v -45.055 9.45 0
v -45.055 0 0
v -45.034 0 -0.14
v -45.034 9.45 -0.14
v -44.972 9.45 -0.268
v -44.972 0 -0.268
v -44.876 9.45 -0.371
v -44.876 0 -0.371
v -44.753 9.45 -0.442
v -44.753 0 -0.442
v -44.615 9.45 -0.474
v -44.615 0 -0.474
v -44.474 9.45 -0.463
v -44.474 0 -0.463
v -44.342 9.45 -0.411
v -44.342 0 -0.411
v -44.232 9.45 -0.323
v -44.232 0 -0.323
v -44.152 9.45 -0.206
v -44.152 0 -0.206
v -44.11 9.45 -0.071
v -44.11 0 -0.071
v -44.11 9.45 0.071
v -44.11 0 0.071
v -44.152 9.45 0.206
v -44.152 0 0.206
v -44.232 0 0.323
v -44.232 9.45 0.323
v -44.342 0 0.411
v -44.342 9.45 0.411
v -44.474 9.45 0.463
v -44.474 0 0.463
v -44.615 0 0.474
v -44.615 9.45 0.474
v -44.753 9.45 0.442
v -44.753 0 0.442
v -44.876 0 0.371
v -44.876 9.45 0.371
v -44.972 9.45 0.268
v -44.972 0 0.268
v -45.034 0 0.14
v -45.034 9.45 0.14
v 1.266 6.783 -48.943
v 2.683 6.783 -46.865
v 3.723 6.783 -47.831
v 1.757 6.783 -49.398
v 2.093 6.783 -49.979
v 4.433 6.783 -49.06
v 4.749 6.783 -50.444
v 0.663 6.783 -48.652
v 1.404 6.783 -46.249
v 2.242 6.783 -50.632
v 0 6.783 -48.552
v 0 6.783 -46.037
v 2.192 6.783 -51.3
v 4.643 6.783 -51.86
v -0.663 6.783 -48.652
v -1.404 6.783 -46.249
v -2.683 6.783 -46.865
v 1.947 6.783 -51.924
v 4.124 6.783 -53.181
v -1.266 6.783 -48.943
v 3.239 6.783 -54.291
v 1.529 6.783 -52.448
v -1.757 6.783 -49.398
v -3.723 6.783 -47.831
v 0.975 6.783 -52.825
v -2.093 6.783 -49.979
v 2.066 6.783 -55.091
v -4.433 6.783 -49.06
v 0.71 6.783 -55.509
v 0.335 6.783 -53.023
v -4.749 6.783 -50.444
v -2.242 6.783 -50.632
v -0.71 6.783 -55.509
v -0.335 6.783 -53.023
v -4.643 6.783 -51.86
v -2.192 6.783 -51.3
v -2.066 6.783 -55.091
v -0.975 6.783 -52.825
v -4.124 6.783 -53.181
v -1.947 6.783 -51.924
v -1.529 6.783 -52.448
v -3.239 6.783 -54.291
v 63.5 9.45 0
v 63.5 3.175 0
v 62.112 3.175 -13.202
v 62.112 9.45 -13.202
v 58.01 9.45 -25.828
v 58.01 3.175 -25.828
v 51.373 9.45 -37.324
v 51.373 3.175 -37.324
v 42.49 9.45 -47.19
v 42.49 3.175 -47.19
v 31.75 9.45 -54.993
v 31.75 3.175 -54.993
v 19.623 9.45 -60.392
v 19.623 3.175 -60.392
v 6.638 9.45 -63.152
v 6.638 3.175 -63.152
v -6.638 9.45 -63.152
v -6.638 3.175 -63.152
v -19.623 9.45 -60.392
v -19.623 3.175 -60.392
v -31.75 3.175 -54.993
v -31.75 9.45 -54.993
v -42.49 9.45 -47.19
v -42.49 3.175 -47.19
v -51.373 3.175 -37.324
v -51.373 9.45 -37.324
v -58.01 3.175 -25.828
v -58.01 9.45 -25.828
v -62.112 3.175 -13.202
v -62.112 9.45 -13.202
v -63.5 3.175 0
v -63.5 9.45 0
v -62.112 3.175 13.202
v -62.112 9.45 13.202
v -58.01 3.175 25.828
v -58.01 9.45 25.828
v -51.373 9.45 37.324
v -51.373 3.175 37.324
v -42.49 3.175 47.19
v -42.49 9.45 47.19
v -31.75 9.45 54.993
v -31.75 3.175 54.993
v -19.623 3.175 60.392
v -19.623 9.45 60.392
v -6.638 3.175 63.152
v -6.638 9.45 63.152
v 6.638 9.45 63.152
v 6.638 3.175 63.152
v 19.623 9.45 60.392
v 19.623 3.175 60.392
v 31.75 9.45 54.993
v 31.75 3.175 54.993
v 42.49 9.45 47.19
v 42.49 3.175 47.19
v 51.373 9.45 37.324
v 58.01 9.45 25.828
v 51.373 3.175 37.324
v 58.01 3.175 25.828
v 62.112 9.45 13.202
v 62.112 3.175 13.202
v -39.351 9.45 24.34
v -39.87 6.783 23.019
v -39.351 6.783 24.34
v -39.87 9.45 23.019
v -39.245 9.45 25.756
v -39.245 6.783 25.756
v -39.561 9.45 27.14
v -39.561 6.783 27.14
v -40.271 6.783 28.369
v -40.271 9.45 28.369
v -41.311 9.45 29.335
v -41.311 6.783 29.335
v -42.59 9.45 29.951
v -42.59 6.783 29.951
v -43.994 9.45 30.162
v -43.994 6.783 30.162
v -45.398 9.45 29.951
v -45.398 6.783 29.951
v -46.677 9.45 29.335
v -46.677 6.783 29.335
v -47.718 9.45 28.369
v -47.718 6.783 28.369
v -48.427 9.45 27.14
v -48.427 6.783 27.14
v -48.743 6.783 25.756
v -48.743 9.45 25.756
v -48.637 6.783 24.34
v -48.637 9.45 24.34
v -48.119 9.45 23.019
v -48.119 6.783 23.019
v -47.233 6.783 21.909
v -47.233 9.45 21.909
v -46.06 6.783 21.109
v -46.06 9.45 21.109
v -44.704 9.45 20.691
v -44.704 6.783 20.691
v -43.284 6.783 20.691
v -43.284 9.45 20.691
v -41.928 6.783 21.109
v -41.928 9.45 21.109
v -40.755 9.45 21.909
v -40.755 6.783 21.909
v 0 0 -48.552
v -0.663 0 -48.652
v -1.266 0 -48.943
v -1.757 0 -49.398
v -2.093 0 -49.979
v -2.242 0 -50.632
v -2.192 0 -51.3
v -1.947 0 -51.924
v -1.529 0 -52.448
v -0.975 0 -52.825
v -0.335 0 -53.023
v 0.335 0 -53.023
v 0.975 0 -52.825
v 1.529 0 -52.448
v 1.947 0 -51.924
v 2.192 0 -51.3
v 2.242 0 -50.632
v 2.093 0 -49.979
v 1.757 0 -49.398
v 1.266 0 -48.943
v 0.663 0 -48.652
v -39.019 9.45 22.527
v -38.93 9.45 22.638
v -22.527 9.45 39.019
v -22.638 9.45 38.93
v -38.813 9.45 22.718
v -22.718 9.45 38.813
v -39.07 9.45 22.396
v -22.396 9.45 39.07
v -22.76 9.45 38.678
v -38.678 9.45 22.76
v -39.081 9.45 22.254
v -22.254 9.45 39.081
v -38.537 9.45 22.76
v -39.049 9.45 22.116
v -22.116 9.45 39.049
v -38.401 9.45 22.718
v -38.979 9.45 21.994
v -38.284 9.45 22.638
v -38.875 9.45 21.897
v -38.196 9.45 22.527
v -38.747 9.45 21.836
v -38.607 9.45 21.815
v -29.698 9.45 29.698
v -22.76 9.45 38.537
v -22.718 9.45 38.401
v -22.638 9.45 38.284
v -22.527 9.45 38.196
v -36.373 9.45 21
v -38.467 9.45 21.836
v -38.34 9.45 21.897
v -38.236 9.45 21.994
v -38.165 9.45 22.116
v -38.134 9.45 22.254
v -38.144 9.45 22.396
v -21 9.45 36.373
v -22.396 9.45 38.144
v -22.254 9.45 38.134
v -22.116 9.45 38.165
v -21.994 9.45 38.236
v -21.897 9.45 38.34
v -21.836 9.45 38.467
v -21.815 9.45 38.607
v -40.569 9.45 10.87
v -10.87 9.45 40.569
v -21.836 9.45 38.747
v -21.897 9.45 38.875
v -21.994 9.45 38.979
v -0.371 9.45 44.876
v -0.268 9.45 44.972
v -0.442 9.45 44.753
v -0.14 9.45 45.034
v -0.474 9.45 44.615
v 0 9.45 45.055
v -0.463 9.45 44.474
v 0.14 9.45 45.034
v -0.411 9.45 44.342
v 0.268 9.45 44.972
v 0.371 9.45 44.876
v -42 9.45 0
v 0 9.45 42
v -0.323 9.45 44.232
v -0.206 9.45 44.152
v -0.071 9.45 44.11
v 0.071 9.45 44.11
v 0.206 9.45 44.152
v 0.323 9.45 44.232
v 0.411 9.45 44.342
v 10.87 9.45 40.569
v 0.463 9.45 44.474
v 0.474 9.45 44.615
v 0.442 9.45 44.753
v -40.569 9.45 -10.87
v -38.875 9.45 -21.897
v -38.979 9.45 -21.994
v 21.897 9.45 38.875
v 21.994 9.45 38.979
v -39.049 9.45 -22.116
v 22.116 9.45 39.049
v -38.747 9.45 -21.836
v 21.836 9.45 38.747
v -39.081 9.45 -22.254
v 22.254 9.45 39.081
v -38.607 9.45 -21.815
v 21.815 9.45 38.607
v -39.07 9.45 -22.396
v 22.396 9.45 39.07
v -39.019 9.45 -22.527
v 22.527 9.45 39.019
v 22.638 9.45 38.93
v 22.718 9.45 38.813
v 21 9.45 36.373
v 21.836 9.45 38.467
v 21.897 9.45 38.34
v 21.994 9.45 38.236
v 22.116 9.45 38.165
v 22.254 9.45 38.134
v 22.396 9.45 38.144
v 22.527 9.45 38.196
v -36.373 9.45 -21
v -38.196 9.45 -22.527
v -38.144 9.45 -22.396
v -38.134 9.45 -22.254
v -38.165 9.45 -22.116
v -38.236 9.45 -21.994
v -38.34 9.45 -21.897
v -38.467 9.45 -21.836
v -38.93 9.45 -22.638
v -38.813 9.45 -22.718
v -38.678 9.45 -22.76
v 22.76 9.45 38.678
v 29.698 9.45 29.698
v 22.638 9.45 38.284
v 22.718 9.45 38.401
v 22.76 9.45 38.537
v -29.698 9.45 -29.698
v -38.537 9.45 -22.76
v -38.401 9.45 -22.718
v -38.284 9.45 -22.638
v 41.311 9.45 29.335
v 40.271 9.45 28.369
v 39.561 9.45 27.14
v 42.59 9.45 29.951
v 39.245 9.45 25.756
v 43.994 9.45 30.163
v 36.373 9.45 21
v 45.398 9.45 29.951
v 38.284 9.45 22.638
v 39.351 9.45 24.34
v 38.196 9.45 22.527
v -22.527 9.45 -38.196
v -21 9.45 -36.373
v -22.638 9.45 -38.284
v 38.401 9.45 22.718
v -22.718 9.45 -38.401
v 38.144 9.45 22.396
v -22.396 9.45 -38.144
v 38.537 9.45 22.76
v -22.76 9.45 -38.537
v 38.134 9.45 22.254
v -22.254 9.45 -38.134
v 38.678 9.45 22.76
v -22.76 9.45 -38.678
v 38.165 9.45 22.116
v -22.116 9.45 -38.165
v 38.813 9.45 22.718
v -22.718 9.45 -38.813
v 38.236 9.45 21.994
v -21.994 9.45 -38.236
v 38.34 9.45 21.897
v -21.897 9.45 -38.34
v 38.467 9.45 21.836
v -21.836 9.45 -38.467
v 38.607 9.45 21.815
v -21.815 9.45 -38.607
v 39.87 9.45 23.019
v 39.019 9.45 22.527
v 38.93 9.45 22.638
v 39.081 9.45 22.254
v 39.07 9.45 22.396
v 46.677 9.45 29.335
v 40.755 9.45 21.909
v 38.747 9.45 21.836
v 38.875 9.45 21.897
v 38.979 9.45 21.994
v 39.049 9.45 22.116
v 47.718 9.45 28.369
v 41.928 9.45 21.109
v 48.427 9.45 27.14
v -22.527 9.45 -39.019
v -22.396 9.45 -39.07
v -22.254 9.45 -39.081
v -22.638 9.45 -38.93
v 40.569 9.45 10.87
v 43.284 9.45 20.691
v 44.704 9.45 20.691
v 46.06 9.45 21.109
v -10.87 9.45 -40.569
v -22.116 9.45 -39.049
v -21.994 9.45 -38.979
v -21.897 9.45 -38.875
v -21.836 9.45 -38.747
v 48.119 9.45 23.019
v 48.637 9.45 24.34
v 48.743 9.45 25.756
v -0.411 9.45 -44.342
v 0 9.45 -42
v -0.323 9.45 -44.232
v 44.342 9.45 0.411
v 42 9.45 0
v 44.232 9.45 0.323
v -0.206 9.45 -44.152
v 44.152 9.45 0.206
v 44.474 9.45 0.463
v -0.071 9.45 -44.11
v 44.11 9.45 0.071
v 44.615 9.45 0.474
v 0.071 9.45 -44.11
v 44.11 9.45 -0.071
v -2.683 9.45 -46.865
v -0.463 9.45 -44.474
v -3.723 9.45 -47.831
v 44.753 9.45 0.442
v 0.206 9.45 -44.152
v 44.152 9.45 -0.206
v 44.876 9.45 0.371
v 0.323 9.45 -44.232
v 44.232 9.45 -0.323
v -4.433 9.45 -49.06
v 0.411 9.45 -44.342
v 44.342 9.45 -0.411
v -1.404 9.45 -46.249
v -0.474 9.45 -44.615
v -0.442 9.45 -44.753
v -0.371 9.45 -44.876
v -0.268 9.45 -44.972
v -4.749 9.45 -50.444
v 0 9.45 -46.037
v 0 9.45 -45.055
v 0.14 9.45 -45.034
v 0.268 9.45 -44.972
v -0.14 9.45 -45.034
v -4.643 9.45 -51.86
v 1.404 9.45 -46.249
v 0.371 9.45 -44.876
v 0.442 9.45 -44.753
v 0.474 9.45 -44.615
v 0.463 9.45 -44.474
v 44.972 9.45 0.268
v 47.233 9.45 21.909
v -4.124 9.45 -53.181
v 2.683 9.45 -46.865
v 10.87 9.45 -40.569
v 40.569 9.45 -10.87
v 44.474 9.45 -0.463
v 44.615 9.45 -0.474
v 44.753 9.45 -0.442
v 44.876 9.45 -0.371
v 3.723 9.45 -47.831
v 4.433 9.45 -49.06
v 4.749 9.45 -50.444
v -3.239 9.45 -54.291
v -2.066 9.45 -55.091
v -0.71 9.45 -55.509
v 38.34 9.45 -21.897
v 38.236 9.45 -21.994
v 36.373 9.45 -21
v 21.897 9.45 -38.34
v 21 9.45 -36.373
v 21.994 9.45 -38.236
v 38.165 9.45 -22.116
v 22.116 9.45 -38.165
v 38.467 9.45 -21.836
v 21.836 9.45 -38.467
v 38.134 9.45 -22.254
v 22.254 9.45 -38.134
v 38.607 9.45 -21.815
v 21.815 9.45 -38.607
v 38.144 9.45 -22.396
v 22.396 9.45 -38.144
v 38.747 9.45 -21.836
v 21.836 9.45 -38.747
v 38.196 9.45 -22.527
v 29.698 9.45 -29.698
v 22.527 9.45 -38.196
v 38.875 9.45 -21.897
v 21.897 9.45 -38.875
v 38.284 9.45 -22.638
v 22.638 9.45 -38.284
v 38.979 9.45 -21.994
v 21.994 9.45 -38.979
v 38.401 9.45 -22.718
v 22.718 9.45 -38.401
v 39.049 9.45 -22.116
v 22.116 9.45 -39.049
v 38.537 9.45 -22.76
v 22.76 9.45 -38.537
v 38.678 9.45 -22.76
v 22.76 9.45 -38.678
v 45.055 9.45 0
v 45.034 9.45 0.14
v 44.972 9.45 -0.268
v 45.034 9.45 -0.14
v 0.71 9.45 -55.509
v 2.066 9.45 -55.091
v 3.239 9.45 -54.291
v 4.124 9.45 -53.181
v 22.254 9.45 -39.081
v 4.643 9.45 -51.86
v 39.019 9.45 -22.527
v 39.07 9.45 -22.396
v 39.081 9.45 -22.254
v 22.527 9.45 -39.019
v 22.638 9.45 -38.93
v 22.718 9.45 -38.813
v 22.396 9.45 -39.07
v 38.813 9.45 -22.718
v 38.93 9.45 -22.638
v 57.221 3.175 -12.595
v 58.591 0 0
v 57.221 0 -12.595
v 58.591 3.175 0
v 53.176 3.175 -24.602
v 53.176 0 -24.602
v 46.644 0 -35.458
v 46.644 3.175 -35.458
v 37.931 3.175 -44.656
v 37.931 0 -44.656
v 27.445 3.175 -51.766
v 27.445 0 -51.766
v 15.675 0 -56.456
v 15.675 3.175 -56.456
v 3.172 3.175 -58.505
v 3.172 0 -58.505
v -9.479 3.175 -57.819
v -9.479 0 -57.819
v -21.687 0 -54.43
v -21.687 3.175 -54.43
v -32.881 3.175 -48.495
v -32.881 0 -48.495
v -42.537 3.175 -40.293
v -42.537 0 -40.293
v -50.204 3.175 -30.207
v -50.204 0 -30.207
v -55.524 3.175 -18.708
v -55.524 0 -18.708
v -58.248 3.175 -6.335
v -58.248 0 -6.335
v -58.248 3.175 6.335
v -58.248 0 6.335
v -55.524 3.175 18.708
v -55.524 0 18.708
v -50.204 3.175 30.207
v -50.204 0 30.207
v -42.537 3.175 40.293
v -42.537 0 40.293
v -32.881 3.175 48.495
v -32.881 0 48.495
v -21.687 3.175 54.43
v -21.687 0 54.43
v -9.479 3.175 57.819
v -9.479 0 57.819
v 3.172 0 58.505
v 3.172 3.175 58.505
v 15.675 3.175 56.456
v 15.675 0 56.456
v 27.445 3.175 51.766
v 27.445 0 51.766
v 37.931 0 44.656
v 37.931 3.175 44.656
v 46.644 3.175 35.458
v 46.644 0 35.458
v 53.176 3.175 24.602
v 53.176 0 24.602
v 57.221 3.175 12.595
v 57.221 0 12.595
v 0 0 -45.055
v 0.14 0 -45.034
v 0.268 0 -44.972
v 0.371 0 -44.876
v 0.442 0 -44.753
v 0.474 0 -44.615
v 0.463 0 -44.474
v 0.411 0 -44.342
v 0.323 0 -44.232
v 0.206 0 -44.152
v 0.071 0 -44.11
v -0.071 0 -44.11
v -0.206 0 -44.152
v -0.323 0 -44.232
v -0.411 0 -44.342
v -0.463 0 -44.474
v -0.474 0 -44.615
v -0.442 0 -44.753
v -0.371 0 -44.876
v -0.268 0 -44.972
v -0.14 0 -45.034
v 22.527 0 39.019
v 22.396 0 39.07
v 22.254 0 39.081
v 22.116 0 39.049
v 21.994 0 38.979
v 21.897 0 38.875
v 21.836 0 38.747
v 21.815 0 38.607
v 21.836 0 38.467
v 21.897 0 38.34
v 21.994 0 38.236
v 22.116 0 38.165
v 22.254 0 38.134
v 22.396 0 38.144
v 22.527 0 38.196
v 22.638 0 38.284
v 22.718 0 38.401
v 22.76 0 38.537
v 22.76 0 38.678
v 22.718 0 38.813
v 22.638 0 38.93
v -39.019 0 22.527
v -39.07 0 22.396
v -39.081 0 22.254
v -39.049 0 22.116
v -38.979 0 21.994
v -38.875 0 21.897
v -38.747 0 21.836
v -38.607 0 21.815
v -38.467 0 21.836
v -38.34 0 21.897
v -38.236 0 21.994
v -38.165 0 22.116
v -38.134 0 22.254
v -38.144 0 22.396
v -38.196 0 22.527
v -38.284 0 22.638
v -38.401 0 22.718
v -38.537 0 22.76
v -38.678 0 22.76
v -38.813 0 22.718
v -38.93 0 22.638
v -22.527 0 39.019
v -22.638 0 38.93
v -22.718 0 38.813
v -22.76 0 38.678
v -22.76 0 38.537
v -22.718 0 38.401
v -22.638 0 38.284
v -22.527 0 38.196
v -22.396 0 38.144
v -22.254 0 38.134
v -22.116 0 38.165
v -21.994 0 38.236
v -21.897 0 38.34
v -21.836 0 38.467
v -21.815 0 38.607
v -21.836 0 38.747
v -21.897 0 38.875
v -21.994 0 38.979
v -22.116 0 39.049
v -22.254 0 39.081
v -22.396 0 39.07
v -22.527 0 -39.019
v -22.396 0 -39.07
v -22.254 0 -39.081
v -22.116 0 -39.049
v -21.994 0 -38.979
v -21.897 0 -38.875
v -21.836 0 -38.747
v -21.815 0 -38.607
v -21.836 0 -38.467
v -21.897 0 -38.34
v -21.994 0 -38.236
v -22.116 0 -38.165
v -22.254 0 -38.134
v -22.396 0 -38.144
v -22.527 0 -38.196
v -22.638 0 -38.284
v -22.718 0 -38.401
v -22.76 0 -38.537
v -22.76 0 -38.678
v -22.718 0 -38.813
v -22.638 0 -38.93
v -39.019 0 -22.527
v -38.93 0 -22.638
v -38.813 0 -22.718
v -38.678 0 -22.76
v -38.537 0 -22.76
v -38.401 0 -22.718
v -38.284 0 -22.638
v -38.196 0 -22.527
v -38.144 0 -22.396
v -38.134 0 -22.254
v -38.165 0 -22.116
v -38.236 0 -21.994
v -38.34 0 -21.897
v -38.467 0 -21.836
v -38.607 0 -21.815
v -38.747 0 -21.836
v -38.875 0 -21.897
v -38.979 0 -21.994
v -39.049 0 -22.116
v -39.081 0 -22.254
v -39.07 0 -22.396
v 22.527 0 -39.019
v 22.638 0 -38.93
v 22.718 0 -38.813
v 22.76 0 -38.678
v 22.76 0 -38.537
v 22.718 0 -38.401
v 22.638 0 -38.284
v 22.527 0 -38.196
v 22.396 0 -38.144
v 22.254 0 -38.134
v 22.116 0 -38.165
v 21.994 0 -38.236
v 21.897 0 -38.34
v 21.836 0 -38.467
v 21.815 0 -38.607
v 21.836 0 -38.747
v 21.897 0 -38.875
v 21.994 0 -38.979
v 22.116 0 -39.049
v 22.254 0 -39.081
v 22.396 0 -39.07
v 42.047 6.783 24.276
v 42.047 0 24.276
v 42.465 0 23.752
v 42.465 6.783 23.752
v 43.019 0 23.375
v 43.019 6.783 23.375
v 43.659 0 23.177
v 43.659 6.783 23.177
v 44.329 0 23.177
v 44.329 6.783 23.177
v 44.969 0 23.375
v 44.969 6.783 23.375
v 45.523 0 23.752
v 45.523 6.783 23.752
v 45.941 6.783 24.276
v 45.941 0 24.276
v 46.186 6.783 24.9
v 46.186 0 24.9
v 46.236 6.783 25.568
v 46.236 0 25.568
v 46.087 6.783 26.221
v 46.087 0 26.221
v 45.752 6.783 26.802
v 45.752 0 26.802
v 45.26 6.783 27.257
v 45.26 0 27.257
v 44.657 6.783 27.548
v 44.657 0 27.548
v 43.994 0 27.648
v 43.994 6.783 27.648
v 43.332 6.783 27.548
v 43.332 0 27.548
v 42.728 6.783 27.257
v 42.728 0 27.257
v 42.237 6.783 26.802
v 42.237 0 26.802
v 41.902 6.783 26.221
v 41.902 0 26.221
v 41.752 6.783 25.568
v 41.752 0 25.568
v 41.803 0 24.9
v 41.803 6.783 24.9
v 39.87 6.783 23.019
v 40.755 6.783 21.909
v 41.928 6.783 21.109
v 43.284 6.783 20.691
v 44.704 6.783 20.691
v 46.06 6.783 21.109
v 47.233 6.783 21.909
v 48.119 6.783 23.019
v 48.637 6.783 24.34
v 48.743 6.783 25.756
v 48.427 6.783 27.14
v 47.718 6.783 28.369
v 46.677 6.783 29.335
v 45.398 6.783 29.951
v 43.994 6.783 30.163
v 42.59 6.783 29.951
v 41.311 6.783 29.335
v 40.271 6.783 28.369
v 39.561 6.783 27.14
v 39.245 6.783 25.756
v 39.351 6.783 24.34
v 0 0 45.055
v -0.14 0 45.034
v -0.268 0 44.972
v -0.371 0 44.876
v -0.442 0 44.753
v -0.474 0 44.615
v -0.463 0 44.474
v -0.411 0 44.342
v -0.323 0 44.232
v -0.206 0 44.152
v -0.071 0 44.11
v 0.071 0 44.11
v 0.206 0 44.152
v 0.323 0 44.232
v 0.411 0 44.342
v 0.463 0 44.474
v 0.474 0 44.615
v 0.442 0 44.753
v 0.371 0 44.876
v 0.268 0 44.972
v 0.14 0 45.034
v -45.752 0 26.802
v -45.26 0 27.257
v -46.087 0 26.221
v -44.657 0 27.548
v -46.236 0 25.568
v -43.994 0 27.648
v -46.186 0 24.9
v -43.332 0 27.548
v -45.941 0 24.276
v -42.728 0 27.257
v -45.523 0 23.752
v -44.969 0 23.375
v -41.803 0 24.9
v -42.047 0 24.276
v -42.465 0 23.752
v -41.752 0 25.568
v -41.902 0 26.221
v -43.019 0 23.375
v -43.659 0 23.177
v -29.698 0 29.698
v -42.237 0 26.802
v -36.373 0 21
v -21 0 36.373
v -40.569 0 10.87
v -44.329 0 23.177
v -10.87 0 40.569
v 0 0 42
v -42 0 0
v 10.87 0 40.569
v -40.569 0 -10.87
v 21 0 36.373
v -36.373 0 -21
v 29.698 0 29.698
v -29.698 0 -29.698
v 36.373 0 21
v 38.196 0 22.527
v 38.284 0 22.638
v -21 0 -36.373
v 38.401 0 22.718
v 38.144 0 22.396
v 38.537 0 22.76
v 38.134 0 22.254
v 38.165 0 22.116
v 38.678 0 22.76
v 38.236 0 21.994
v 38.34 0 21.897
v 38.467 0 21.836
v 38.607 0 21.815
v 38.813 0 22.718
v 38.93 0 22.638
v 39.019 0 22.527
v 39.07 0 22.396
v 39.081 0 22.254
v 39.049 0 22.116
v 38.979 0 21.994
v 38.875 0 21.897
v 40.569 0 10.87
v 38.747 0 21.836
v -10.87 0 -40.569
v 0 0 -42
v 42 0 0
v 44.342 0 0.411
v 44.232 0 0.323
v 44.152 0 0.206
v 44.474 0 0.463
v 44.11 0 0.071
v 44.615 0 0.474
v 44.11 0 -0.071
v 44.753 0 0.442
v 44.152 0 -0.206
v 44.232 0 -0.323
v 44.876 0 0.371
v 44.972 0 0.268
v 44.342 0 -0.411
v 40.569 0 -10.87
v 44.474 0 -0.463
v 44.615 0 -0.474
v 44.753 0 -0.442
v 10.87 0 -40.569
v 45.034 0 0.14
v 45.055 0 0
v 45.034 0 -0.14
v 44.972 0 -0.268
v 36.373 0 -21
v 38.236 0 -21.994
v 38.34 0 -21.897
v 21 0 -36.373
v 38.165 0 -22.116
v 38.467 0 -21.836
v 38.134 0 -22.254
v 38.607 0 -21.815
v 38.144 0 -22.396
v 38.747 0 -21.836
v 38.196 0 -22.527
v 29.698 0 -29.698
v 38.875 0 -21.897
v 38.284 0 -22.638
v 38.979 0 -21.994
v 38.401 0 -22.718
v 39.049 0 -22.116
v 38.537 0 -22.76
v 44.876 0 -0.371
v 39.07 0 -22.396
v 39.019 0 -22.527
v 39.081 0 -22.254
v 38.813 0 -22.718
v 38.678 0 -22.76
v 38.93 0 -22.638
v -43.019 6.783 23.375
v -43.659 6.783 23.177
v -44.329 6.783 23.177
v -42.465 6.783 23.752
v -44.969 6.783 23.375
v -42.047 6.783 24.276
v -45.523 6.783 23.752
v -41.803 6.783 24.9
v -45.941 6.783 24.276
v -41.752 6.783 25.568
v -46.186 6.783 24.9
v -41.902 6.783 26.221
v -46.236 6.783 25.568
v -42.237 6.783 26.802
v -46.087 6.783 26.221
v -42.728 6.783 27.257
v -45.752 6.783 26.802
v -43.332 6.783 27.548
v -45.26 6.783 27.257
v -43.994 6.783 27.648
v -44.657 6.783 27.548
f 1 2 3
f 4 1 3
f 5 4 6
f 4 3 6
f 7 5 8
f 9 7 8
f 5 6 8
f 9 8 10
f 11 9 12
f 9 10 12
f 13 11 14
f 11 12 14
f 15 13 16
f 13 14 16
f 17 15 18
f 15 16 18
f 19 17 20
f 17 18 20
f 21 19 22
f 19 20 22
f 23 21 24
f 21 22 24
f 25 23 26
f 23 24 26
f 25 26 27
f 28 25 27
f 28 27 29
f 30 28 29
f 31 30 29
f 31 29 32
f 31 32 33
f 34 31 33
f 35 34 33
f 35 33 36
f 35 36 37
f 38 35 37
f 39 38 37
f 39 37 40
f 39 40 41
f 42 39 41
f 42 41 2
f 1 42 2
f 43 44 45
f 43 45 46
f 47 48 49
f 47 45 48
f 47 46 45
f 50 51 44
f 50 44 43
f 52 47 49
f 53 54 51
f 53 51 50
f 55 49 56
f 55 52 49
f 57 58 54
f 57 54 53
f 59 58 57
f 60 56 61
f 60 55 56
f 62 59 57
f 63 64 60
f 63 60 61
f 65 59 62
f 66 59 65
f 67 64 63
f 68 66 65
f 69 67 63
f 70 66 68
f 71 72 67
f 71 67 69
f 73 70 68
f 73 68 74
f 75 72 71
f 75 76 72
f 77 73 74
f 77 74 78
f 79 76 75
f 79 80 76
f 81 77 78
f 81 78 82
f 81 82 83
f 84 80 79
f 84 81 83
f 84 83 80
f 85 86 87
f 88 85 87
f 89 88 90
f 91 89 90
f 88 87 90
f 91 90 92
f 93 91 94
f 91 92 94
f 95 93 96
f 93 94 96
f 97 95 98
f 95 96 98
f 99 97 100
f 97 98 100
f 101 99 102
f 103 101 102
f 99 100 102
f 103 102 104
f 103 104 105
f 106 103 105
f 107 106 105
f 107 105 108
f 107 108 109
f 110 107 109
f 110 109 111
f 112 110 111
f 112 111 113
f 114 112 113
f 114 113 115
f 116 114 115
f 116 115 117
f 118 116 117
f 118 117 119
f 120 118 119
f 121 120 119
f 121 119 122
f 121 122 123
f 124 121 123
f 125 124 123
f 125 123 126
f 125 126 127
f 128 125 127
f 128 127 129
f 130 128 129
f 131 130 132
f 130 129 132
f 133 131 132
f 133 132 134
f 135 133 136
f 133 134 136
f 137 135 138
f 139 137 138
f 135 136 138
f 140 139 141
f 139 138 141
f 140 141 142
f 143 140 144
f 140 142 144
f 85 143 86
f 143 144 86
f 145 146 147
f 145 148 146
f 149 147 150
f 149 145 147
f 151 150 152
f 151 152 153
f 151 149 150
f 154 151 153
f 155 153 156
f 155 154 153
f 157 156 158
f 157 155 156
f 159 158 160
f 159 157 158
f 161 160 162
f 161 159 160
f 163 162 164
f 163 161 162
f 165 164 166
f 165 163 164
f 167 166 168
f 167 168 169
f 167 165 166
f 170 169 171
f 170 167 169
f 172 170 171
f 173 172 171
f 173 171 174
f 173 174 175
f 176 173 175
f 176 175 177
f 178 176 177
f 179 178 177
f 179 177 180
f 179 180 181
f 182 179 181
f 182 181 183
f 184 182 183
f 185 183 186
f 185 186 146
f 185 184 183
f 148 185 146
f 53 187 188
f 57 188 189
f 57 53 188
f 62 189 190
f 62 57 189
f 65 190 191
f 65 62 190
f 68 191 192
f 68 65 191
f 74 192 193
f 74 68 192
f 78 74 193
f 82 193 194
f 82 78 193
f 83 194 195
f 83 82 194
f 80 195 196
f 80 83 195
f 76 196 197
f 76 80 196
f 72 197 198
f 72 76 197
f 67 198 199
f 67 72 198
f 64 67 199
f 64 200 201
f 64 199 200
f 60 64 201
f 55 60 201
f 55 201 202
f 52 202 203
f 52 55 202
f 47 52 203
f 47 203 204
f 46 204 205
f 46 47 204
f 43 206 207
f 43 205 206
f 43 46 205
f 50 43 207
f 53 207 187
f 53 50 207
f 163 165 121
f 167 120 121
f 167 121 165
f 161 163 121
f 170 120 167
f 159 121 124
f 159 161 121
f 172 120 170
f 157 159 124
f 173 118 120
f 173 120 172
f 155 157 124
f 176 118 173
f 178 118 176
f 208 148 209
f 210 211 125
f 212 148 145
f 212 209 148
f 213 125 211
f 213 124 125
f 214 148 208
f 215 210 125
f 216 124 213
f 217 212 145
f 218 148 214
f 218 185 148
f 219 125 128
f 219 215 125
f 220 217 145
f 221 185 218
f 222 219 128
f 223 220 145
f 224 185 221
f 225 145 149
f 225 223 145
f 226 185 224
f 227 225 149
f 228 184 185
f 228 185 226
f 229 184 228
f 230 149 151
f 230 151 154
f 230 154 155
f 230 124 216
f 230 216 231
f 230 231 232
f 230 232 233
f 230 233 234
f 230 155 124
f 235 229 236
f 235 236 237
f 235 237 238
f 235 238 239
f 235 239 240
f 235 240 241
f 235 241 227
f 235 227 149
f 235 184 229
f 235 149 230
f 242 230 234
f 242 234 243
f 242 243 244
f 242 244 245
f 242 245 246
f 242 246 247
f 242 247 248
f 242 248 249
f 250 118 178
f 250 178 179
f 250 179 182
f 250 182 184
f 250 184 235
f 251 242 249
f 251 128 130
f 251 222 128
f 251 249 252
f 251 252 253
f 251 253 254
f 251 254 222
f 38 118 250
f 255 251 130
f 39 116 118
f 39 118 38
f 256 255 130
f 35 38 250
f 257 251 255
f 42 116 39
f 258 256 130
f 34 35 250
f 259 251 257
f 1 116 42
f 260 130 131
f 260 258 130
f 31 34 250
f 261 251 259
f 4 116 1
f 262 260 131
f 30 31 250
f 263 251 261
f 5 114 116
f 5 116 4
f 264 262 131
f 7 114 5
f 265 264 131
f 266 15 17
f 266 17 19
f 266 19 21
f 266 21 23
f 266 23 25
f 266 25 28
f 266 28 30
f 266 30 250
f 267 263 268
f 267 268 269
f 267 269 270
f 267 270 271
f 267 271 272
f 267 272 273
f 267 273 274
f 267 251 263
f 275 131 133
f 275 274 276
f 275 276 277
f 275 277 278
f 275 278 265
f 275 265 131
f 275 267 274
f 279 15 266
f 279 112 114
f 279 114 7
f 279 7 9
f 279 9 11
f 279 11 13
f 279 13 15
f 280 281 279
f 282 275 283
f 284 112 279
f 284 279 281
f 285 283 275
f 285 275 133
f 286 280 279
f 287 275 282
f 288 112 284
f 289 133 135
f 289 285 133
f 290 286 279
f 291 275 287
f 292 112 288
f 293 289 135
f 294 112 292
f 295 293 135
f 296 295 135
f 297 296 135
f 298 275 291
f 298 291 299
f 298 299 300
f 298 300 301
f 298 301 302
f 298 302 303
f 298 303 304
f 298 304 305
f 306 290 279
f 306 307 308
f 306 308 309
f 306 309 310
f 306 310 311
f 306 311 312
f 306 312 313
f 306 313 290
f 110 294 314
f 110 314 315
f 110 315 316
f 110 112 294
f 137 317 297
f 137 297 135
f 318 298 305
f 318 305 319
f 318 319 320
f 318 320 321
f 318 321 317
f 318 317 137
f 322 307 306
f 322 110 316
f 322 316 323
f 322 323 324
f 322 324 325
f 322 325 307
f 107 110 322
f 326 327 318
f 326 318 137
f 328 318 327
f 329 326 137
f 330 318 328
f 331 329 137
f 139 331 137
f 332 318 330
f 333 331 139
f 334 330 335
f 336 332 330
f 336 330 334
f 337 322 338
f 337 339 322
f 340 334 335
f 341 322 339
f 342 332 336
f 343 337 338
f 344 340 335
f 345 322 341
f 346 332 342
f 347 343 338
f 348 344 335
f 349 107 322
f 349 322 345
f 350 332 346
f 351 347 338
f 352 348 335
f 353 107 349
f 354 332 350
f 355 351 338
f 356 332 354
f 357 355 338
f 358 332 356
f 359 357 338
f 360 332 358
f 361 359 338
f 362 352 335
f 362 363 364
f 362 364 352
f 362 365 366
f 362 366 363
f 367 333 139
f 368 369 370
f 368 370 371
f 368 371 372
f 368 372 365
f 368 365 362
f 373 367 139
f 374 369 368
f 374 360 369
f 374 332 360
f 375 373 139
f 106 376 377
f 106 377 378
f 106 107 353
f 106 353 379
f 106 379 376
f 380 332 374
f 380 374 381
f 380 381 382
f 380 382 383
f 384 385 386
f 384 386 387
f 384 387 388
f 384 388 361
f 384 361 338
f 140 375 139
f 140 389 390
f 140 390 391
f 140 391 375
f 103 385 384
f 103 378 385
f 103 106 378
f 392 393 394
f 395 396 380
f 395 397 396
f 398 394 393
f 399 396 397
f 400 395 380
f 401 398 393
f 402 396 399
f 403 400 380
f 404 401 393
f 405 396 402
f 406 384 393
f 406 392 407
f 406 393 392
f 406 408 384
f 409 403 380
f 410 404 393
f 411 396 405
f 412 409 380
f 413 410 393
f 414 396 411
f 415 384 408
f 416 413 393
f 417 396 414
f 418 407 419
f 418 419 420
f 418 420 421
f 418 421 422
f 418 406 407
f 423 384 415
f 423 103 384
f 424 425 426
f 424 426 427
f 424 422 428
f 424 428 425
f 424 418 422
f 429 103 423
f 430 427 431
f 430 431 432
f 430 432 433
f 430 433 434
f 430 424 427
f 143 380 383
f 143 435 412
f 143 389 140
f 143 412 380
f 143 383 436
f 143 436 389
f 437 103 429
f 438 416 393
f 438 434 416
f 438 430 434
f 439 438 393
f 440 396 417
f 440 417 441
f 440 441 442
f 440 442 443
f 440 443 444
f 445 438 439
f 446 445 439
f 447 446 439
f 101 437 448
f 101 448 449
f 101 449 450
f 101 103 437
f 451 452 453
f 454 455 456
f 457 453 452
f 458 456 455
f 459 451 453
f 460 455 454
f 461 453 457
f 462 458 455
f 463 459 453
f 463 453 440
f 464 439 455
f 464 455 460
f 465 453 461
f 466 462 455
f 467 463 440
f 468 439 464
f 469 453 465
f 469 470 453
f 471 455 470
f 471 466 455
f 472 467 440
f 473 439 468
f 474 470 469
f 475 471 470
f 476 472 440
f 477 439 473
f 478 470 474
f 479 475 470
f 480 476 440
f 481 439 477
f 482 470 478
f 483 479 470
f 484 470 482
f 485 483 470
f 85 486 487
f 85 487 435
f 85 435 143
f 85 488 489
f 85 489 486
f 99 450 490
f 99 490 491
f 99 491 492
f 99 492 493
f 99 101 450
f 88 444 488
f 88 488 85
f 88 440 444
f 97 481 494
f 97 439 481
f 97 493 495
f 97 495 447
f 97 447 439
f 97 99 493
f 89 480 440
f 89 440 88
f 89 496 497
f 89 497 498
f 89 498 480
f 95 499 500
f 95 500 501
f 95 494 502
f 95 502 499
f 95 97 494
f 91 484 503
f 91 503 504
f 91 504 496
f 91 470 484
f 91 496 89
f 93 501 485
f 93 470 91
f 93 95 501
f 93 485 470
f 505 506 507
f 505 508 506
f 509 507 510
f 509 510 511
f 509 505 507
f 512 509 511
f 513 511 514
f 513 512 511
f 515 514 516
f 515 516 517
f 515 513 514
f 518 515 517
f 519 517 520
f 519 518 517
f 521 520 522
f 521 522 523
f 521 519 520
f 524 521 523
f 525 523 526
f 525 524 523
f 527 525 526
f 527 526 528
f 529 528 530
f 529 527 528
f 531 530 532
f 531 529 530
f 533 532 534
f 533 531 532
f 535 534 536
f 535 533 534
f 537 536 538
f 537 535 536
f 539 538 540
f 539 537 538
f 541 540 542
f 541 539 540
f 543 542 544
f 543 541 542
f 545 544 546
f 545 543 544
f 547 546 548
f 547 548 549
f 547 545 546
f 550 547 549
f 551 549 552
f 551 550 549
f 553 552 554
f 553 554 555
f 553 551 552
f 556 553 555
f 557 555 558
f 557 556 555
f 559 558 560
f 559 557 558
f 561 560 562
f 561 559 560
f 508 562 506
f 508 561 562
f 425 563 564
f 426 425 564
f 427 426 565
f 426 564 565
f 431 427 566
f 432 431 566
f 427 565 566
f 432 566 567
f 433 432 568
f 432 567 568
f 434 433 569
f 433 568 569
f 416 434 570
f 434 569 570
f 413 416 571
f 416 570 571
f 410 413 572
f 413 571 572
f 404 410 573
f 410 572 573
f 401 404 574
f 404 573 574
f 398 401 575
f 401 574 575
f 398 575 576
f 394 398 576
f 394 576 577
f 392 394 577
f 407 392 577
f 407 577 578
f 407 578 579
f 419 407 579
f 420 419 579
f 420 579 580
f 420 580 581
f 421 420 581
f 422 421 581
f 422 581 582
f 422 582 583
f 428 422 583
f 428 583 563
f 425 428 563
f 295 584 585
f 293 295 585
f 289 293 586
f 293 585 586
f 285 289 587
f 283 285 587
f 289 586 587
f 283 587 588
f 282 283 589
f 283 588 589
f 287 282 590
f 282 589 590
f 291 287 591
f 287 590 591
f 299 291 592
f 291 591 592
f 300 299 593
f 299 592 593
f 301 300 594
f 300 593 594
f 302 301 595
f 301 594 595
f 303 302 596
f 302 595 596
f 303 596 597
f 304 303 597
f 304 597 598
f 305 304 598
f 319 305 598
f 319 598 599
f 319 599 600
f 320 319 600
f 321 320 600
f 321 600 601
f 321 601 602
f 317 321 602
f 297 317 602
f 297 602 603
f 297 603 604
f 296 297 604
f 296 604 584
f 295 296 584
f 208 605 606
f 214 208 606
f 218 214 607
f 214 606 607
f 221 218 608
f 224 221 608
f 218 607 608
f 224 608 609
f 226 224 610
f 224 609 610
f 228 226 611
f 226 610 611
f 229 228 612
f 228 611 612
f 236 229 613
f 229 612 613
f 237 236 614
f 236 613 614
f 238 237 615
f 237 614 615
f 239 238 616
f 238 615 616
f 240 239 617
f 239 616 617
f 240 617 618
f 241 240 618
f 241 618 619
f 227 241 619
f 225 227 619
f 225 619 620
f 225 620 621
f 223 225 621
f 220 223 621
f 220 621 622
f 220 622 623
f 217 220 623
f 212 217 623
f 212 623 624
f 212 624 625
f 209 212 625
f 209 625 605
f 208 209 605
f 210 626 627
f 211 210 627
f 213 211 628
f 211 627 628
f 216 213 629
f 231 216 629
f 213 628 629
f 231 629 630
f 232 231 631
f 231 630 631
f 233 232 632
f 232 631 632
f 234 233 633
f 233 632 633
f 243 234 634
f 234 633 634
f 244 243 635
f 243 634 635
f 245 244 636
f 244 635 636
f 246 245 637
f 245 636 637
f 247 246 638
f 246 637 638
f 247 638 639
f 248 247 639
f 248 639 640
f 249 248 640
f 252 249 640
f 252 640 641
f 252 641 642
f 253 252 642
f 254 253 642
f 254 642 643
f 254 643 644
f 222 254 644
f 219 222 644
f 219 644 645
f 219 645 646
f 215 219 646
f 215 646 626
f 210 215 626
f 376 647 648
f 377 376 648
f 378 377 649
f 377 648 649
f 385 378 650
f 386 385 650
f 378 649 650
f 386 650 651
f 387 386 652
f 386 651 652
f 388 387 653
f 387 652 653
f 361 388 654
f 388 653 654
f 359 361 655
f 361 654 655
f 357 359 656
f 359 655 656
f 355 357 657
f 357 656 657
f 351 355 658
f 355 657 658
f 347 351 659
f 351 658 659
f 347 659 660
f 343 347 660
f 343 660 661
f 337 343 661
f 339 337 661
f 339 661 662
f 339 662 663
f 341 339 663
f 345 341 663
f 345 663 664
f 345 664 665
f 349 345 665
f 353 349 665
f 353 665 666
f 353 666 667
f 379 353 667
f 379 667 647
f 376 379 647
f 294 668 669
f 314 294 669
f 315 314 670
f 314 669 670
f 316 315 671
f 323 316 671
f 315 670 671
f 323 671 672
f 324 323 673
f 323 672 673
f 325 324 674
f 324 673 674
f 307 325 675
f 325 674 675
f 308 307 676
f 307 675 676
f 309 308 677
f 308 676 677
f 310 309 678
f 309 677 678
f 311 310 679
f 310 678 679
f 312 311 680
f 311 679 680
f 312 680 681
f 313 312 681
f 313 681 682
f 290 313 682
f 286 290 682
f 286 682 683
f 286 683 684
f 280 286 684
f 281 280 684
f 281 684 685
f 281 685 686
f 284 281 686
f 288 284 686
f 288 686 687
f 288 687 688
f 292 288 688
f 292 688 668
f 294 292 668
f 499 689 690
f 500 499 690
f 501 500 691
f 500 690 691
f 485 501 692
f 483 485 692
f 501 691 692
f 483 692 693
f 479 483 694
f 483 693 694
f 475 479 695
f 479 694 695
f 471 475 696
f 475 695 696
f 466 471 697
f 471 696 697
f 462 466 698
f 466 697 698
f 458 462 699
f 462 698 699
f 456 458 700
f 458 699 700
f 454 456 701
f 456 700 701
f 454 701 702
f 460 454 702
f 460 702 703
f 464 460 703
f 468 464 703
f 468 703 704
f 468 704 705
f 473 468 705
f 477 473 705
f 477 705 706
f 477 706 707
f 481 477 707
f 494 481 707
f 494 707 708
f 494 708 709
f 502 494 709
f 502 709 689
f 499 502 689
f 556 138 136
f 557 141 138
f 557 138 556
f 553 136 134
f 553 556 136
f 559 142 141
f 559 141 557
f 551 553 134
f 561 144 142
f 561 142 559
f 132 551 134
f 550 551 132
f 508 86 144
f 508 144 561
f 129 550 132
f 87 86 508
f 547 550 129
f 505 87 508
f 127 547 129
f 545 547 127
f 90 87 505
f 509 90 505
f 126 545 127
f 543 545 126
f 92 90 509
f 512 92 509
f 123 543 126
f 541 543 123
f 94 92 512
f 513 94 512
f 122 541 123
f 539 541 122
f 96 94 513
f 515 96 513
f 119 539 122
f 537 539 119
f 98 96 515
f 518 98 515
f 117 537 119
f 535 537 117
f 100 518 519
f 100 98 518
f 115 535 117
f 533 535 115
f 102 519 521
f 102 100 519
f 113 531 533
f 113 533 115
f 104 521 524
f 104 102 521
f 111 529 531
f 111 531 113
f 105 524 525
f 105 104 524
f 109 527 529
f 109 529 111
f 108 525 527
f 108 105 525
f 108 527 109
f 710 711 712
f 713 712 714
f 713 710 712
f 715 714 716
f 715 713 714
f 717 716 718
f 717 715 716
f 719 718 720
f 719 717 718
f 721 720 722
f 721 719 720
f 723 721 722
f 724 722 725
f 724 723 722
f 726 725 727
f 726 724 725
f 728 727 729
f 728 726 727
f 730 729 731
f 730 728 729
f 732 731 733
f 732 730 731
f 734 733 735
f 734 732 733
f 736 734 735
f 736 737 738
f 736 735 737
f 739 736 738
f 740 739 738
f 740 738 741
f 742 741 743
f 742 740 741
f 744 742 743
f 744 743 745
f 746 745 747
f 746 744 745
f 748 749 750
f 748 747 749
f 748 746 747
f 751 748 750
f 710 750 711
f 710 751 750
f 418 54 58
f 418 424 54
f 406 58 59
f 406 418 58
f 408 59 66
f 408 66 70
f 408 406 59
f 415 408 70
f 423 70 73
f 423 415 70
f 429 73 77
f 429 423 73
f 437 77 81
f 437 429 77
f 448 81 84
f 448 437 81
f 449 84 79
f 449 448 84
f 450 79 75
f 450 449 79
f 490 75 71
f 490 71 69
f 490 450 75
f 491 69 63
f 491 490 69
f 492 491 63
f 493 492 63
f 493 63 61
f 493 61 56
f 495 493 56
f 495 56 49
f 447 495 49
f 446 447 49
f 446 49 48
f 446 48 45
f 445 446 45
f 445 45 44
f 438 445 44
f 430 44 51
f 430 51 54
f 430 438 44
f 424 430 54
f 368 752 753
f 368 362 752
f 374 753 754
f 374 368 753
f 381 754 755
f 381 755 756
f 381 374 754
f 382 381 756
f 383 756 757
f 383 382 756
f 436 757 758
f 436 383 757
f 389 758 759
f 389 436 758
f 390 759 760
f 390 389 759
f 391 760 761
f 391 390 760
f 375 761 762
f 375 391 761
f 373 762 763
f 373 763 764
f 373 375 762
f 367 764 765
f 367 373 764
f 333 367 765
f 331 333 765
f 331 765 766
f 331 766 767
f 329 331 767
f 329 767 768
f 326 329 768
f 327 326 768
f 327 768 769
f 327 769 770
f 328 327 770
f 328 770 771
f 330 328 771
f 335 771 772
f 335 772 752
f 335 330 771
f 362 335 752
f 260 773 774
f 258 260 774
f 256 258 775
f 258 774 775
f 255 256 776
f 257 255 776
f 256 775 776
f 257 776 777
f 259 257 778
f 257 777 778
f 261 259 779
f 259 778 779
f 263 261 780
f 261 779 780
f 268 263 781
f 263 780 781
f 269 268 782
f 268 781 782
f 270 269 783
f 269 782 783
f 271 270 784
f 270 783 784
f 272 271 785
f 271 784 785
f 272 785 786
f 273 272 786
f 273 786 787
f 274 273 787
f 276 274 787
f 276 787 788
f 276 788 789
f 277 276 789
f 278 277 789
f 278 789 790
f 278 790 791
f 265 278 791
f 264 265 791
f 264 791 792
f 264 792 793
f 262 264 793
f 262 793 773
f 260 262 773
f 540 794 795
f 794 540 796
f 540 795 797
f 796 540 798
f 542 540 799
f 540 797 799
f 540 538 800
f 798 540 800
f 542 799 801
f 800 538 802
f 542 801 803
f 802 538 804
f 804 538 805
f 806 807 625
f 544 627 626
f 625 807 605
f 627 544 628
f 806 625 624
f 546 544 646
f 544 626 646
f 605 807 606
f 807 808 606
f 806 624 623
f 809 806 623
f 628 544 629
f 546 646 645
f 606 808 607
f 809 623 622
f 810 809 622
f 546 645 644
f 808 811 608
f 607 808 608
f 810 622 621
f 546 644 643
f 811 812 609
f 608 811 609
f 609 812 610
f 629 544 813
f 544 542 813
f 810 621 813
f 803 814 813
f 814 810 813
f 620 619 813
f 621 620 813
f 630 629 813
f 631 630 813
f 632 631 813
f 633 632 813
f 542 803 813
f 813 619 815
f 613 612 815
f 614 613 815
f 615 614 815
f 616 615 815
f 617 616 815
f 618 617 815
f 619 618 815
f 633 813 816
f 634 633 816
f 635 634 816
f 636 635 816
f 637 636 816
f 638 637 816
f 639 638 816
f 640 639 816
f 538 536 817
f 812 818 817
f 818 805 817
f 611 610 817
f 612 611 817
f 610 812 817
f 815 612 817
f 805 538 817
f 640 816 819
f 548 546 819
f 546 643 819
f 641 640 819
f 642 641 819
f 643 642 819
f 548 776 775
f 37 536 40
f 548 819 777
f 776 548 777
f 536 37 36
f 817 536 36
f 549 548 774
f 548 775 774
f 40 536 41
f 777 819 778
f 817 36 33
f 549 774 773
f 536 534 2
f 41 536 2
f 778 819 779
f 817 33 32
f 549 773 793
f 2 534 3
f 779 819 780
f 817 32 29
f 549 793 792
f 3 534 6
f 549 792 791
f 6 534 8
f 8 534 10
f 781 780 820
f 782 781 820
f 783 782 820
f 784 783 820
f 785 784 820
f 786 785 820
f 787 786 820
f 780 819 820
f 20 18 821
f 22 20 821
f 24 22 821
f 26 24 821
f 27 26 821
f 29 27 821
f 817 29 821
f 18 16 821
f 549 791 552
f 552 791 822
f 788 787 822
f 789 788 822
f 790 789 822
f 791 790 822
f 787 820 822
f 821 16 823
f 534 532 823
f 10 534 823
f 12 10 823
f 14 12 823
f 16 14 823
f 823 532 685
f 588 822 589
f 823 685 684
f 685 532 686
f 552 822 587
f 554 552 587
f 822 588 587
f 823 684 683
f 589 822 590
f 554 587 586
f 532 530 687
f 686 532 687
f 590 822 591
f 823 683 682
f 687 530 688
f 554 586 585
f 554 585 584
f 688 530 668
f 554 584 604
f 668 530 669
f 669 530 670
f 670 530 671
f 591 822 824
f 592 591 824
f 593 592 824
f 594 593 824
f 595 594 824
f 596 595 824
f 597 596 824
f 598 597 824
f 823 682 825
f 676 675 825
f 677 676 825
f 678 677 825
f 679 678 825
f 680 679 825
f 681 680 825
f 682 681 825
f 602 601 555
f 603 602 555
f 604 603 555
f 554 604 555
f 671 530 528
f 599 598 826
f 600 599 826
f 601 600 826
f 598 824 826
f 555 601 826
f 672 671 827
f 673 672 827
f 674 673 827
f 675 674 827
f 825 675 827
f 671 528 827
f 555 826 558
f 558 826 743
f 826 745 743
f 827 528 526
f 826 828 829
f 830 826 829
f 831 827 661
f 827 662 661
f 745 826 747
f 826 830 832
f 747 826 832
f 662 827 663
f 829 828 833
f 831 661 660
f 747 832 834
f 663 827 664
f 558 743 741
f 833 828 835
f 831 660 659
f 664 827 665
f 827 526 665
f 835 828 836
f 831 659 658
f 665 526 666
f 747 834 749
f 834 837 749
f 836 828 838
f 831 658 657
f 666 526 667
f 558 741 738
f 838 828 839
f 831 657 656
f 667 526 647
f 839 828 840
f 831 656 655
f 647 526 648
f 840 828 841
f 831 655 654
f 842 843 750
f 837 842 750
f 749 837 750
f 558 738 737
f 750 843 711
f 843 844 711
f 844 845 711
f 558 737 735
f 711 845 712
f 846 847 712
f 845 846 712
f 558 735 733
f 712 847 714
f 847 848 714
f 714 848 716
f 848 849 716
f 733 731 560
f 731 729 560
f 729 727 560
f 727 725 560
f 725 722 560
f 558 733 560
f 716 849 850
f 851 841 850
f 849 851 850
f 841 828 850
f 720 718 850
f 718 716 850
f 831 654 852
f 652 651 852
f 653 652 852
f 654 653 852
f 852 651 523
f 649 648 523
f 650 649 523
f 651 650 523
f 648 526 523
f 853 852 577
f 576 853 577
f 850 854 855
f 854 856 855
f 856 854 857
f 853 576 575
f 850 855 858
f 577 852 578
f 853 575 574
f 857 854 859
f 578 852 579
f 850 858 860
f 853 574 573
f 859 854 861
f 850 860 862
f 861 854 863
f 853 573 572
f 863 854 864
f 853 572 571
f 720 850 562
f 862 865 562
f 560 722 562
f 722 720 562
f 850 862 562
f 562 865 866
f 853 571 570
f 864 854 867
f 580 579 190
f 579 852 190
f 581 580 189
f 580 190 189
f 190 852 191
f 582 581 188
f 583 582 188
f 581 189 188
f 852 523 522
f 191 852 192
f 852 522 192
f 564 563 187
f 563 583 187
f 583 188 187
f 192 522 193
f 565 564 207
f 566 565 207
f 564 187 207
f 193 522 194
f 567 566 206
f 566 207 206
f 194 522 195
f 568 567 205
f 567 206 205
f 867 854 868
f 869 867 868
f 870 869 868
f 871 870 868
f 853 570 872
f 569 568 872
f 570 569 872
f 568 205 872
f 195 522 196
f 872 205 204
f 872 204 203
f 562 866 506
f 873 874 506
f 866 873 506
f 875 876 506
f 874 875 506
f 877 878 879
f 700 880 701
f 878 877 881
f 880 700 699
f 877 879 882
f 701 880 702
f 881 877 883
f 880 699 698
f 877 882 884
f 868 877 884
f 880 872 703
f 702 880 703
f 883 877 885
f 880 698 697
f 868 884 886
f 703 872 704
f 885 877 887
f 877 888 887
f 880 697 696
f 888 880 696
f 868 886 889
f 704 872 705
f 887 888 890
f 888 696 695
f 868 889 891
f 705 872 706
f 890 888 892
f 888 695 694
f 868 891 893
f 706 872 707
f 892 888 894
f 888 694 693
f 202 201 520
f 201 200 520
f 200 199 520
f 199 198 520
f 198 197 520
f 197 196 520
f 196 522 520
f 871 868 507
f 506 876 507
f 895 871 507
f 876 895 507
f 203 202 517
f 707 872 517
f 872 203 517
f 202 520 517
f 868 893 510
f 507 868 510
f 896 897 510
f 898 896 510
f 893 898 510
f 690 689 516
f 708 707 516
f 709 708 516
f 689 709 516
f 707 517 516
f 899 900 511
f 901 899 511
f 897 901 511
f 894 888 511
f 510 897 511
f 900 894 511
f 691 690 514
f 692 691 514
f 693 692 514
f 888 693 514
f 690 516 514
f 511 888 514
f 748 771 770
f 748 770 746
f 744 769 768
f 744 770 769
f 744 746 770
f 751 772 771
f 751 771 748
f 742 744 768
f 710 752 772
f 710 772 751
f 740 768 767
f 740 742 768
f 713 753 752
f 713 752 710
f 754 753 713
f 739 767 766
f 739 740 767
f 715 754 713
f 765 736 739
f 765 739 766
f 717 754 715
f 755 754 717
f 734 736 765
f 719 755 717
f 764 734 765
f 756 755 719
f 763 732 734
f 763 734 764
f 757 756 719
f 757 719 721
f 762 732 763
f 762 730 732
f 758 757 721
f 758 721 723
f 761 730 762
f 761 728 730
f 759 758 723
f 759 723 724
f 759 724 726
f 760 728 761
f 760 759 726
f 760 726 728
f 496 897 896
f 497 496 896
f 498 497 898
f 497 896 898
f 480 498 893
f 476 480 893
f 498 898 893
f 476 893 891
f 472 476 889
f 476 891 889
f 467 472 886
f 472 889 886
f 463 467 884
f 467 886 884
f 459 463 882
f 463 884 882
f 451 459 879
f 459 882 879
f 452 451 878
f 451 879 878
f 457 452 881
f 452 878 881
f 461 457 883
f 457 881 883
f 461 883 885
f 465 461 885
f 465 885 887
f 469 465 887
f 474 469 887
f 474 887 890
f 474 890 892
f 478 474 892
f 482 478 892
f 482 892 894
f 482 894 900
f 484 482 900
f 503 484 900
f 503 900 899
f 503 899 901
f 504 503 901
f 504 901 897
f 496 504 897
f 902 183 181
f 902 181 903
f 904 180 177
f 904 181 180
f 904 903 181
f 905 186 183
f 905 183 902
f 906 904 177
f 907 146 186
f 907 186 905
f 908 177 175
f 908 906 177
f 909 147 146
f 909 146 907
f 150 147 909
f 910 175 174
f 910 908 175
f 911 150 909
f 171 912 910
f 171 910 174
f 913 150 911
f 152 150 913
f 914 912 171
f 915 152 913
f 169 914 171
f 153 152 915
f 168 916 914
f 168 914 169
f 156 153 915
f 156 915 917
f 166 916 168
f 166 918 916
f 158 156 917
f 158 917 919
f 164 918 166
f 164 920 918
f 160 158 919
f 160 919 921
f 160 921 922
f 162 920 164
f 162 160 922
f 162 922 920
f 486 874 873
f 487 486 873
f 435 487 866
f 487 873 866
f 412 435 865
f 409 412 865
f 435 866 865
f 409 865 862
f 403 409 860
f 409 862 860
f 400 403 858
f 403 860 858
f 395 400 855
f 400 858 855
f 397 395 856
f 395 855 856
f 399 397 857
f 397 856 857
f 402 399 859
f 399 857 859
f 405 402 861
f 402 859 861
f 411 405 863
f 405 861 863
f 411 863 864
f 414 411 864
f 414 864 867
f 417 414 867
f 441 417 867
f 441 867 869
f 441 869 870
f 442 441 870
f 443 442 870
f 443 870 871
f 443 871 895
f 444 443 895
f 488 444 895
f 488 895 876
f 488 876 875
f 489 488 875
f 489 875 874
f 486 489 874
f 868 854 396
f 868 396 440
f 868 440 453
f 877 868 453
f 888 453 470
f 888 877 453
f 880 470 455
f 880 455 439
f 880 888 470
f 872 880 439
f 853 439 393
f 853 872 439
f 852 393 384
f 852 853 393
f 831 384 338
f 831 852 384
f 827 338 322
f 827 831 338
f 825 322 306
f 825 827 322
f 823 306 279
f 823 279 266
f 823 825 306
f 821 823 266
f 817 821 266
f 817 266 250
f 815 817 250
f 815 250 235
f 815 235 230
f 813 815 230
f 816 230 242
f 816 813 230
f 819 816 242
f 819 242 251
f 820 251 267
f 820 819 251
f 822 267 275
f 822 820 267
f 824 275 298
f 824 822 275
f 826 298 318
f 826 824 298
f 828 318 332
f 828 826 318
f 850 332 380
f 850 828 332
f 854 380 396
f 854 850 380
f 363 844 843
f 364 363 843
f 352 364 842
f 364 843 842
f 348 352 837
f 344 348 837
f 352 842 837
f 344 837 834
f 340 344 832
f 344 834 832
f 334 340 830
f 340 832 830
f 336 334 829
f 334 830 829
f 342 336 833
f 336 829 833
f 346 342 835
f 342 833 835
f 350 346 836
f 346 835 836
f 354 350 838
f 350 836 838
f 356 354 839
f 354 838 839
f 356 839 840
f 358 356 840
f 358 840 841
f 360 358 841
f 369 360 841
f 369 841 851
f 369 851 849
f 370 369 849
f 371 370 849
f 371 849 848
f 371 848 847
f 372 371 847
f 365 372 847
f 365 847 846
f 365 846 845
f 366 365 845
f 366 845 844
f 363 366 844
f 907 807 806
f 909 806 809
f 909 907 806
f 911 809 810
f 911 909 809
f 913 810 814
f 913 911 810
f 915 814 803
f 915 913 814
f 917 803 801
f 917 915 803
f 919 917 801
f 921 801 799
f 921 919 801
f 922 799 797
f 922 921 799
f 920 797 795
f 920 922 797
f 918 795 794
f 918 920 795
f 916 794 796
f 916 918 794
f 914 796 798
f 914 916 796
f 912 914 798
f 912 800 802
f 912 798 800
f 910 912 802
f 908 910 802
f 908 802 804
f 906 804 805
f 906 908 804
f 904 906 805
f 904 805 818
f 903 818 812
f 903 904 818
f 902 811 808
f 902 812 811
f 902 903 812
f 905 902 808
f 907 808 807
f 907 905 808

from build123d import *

# Parameters (mm, degrees)
SKETCH2_R                = 63.5
SKETCH2_R_2              = 42.0000049
BOSS_EXTRUDE1_DEPTH      = 9.449999896
SKETCH27_W               = 4.908836101
SKETCH27_H               = 3.175
CIRPATTERN1_COUNT        = 3
M1_2X0_25_TAPPED_HOLE2_D = 0.95
CIRPATTERN2_COUNT        = 12


with BuildPart() as part:
    # Sketch2 → Boss-Extrude1 (new body)
    with BuildSketch(Plane(origin=(0, 0, 0), x_dir=(1, 0, 0), z_dir=(0, 1, 0))):
        Circle(SKETCH2_R)
        Circle(SKETCH2_R_2, mode=Mode.SUBTRACT)
    extrude(amount=BOSS_EXTRUDE1_DEPTH)

    # Sketch27 → Cut-Revolve1 (revolve, cut)
    with BuildSketch(Plane.XY):
        with Locations((61.04558195, 1.5875)):
            Rectangle(SKETCH27_W, SKETCH27_H)
    revolve(axis=Axis((0, 0, 0), (0, 1, 0)), mode=Mode.SUBTRACT)

    # Sketch33 → CBORE for #8 Binding Head Machine Screw1 (revolve, cut)
    with BuildSketch(Plane(origin=(0, 9.449999896, -50.8), x_dir=(0, 0, 1), z_dir=(1, 0, 0))):
        Polygon((0, 0), (0, 503.000674586), (2.2479, 501.65), (2.2479, 2.667), (4.7625, 2.667), (4.7625, 0), align=None)
    cbore_for_8_binding_head_machine_screw1 = revolve(axis=Axis((0, 15.799999896, -50.8), (0, -1, 0)), mode=Mode.SUBTRACT)

    # CirPattern1: CBORE for #8 Binding Head Machine Screw1 ×3 about axis
    cirpattern1_axis = Axis((0, 9.449999896, 0), (0, -1, 0))
    for i in range(1, CIRPATTERN1_COUNT):
        add(cbore_for_8_binding_head_machine_screw1.rotate(cirpattern1_axis, i * 360 / CIRPATTERN1_COUNT), mode=Mode.SUBTRACT)

    # M1.2x0.25 Tapped Hole2 (through all)
    with Locations(Plane(origin=(0, 9.449999896, -44.579871472), x_dir=(0, 0, 1), z_dir=(0, 1, 0))):
        with Locations((0, 0)):
            m1_2x0_25_tapped_hole2 = Hole(M1_2X0_25_TAPPED_HOLE2_D / 2)

    # CirPattern2: M1.2x0.25 Tapped Hole2 ×12 about axis
    cirpattern2_axis = Axis((0, 9.449999896, 0), (0, -1, 0))
    for i in range(1, CIRPATTERN2_COUNT):
        add(m1_2x0_25_tapped_hole2.rotate(cirpattern2_axis, i * 360 / CIRPATTERN2_COUNT), mode=Mode.SUBTRACT)


solid = part.part
